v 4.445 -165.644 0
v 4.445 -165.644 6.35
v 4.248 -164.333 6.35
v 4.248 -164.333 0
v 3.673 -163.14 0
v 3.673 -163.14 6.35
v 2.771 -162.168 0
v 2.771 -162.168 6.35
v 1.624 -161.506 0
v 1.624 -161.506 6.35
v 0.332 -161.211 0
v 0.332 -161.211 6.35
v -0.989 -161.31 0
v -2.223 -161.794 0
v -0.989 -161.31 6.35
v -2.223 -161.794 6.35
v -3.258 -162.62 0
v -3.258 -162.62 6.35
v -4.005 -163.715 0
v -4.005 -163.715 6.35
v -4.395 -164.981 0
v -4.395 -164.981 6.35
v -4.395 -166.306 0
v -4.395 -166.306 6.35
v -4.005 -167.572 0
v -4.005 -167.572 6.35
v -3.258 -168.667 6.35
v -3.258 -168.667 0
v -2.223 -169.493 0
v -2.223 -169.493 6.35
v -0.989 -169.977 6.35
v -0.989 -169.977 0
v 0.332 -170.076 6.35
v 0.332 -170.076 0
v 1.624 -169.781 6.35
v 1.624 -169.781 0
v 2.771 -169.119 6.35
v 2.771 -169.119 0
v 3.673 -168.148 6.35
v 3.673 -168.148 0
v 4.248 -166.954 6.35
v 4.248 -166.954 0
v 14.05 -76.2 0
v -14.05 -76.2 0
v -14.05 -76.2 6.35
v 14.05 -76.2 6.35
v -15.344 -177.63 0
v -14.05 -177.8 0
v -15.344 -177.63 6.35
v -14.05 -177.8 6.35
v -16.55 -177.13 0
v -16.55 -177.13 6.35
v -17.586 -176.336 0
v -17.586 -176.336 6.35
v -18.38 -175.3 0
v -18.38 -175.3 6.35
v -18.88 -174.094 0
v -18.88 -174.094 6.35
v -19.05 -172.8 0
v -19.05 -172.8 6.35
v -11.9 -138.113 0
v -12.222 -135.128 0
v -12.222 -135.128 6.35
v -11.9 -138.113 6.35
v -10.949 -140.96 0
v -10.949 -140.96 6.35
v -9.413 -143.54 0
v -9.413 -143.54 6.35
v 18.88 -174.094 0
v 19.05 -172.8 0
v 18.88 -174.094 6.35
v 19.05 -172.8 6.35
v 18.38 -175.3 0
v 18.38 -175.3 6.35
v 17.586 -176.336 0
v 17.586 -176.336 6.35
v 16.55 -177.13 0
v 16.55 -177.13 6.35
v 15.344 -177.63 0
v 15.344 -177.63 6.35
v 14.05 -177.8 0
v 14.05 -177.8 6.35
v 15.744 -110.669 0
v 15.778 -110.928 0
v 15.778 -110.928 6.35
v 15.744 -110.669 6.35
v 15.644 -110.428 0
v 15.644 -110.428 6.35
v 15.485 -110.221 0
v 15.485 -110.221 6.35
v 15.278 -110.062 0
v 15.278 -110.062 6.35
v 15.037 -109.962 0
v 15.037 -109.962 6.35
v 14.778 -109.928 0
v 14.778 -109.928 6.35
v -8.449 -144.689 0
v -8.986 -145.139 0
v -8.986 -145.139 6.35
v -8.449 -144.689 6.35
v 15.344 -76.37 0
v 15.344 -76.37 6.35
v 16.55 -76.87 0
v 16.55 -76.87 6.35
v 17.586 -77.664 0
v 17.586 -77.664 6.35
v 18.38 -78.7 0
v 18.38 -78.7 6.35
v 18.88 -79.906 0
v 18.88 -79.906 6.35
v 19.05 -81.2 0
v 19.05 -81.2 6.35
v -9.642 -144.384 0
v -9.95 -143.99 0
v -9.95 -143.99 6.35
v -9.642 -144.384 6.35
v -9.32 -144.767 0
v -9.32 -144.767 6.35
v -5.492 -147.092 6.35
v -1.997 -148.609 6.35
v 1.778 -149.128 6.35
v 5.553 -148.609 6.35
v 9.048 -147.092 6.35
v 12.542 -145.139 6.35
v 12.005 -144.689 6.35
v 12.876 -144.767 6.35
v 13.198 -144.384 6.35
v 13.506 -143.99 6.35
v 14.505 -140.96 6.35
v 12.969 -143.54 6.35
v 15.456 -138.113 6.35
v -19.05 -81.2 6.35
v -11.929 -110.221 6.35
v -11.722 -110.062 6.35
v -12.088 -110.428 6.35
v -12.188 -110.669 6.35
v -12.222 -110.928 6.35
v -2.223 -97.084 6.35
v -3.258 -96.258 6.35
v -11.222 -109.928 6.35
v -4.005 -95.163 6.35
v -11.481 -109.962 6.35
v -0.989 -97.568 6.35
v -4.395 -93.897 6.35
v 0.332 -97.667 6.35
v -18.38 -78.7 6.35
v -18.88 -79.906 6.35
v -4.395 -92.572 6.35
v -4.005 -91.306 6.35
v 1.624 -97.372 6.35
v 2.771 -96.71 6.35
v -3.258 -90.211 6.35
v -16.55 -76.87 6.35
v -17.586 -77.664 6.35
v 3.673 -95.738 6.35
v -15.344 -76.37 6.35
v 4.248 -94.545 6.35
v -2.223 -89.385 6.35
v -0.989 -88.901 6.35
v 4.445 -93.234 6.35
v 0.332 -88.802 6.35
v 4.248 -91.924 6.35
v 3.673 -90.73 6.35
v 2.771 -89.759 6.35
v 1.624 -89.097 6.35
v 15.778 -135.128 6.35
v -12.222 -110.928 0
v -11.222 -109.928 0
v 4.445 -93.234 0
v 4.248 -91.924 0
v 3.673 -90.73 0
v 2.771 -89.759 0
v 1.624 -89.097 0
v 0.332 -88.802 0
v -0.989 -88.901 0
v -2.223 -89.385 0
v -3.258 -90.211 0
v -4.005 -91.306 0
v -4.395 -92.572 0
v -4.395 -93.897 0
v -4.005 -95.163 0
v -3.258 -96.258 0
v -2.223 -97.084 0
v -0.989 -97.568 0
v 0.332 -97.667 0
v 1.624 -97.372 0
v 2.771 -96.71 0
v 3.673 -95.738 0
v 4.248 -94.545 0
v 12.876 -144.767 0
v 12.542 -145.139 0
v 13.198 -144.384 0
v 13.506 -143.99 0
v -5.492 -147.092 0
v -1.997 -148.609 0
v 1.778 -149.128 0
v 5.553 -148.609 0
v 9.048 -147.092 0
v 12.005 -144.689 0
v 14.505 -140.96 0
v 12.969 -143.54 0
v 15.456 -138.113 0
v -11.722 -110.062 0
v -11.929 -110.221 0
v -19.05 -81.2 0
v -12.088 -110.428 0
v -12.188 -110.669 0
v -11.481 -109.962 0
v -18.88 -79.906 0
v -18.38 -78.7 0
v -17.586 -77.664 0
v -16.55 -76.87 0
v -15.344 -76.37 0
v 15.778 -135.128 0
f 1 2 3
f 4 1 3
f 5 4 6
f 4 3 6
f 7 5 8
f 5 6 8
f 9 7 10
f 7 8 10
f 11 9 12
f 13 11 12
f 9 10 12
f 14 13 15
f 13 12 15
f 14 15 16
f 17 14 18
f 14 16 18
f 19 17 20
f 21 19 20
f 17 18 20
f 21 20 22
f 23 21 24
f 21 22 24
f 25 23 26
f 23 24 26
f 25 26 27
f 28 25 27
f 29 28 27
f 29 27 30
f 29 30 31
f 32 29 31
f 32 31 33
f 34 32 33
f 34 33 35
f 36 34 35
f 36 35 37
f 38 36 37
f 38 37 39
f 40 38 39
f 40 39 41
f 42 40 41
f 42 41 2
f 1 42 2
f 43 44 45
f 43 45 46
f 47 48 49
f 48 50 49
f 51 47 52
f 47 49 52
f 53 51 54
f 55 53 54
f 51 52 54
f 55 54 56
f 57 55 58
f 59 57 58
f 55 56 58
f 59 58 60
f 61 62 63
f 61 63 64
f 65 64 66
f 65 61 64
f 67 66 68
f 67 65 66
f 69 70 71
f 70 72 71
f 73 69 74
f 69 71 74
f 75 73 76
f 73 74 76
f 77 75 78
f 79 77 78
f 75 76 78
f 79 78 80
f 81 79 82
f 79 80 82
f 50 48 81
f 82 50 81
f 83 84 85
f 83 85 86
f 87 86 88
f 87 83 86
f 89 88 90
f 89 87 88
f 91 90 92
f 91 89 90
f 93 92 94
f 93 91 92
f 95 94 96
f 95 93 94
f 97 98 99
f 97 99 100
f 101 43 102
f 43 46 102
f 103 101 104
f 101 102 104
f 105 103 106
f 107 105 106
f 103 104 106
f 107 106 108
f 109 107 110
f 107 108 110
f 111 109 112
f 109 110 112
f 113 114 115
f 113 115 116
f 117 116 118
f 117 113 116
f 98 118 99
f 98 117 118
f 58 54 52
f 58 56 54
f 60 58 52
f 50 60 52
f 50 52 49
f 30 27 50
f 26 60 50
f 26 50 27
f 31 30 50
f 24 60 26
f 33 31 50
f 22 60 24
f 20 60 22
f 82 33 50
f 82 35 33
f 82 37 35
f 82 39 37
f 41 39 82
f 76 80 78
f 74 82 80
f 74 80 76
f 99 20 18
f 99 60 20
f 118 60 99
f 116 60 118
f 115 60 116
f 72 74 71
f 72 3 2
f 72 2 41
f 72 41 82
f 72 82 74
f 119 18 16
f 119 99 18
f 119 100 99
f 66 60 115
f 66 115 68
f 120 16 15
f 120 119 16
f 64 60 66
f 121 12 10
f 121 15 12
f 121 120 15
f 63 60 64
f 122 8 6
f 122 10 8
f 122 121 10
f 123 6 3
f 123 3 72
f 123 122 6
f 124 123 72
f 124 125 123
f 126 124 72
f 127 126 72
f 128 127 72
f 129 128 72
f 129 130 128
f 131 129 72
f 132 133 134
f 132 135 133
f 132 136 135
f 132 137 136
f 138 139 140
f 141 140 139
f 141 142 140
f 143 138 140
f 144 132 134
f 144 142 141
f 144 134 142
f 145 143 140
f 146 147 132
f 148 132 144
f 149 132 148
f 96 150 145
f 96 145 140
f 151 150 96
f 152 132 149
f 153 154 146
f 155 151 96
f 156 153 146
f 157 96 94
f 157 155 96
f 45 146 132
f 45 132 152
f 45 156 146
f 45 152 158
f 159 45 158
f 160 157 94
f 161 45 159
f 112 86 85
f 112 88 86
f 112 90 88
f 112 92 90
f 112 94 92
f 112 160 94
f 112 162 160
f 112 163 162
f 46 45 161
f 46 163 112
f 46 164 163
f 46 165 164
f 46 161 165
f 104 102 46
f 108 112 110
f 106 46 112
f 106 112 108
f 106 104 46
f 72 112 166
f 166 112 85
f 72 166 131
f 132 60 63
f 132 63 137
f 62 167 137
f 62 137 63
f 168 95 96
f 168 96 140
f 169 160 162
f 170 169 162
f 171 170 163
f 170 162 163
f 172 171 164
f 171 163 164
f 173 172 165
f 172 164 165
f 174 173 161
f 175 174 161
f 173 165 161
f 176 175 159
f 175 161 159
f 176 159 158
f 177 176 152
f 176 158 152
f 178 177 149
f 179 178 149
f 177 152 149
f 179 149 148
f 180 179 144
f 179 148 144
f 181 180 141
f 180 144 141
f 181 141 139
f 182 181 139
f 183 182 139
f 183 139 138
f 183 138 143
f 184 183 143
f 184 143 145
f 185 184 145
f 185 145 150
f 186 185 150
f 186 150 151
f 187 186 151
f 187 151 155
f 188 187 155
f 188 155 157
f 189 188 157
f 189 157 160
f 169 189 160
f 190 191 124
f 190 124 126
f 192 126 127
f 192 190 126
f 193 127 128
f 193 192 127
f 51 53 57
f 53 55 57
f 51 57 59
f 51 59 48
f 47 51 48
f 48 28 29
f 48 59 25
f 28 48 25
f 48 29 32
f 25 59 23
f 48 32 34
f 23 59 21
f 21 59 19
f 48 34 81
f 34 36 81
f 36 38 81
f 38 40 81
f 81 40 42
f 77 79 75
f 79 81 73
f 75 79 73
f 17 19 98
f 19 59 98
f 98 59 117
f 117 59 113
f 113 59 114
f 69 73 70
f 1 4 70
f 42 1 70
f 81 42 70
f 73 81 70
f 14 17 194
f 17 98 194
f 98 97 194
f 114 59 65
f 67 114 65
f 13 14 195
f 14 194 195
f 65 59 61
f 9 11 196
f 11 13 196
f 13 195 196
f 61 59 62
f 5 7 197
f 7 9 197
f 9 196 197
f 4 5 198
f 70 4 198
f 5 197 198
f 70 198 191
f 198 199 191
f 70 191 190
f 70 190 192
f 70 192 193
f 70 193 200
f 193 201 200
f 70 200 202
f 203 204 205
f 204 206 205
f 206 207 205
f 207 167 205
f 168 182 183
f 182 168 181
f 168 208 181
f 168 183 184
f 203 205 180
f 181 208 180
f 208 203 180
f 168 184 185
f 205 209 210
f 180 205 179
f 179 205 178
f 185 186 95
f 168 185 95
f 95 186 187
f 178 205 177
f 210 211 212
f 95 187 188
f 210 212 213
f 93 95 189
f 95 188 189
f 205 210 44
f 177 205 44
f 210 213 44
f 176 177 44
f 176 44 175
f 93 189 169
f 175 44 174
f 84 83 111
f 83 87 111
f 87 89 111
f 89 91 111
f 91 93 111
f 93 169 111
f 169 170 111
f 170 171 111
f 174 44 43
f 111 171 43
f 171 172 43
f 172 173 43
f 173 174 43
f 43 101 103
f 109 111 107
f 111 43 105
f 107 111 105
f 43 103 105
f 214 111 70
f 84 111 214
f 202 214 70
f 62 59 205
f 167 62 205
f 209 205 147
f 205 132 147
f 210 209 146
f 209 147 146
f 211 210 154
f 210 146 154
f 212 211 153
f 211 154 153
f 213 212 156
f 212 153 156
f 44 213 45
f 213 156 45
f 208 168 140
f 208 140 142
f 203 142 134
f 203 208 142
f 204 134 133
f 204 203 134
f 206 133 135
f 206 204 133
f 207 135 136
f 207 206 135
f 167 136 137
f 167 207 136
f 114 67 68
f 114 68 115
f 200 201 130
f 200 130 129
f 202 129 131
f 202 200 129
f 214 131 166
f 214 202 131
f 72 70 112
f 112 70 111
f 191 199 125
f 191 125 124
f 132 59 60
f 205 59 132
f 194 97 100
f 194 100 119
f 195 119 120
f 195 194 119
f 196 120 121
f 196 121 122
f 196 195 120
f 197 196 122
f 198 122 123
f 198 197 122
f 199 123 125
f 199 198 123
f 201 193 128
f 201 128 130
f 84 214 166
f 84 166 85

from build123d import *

# Parameters (mm, degrees)
SKETCH1_W           = 38.1
SKETCH1_H           = 101.6
BOSS_EXTRUDE1_DEPTH = 6.35
FILLET1_R           = 5
FILLET2_R           = 5
FILLET3_R           = 5
FILLET4_R           = 5
CUT_EXTRUDE1_REACH  = 180.93
SKETCH2_R           = 4.445


with BuildPart() as part:
    # Sketch1 → Boss-Extrude1 (new body)
    with BuildSketch(Plane.XY):
        with Locations((0, -127)):
            Rectangle(SKETCH1_W, SKETCH1_H)
        with BuildLine():
            Line((-12.222, -110.928), (-12.222, -135.128))
            ThreePointArc((-12.222, -135.128), (-11.501276628, -139.562051447), (-9.413312538, -143.539570822))
            Line((-9.413312538, -143.539570822), (-9.95027795, -143.990138361))
            ThreePointArc((-9.95027795, -143.990138361), (-9.482853323, -144.576977852), (-8.986096678, -145.139204858))
            Line((-8.986096678, -145.139204858), (-8.44913124, -144.688637356))
            ThreePointArc((-8.44913124, -144.688637356), (1.777999803, -149.128000002), (12.005130971, -144.688637644))
            Line((12.005130971, -144.688637644), (12.542096526, -145.139205022))
            ThreePointArc((12.542096526, -145.139205022), (13.038853251, -144.576977937), (13.506277951, -143.99013836))
            Line((13.506277951, -143.99013836), (12.969312655, -143.539570964))
            ThreePointArc((12.969312655, -143.539570964), (15.057276792, -139.562051525), (15.77800018, -135.128))
            Line((15.77800018, -135.128), (15.77800018, -110.928))
            ThreePointArc((15.77800018, -110.928), (15.485106961, -110.220893219), (14.77800018, -109.928))
            Line((14.77800018, -109.928), (-11.222, -109.928))
            ThreePointArc((-11.222, -109.928), (-11.929106781, -110.220893219), (-12.222, -110.928))
        make_face(mode=Mode.SUBTRACT)
    extrude(amount=BOSS_EXTRUDE1_DEPTH)

    # Fillet1
    fillet1_edges = [part.edges().sort_by_distance(p)[0] for p in [
        (-19.05, -76.2, 3.175),
    ]]
    fillet(fillet1_edges, radius=FILLET1_R)

    # Fillet2
    fillet2_edges = [part.edges().sort_by_distance(p)[0] for p in [
        (19.05, -76.2, 3.175),
    ]]
    fillet(fillet2_edges, radius=FILLET2_R)

    # Fillet3
    fillet3_edges = [part.edges().sort_by_distance(p)[0] for p in [
        (19.05, -177.8, 3.175),
    ]]
    fillet(fillet3_edges, radius=FILLET3_R)

    # Fillet4
    fillet4_edges = [part.edges().sort_by_distance(p)[0] for p in [
        (-19.05, -177.8, 3.175),
    ]]
    fillet(fillet4_edges, radius=FILLET4_R)

    # Sketch2 → Cut-Extrude1 (cut, up to next)
    with BuildSketch(Plane.XY.offset(6.35), mode=Mode.PRIVATE) as cut_extrude1_sk1:
        with Locations((0, -93.234389415)):
            Circle(SKETCH2_R)
    cut_extrude1_tool1 = extrude(cut_extrude1_sk1.sketch, amount=-CUT_EXTRUDE1_REACH, mode=Mode.PRIVATE) & part.part
    # Sketch2 → Cut-Extrude1 (cut, up to next)
    with BuildSketch(Plane.XY.offset(6.35), mode=Mode.PRIVATE) as cut_extrude1_sk2:
        with Locations((0, -165.643685175)):
            Circle(SKETCH2_R)
    cut_extrude1_tool2 = extrude(cut_extrude1_sk2.sketch, amount=-CUT_EXTRUDE1_REACH, mode=Mode.PRIVATE) & part.part
    add(cut_extrude1_tool1.solids().sort_by_distance((0, -93.234389, 6.35))[0], mode=Mode.SUBTRACT)
    add(cut_extrude1_tool2.solids().sort_by_distance((0, -165.643685, 6.35))[0], mode=Mode.SUBTRACT)


solid = part.part
